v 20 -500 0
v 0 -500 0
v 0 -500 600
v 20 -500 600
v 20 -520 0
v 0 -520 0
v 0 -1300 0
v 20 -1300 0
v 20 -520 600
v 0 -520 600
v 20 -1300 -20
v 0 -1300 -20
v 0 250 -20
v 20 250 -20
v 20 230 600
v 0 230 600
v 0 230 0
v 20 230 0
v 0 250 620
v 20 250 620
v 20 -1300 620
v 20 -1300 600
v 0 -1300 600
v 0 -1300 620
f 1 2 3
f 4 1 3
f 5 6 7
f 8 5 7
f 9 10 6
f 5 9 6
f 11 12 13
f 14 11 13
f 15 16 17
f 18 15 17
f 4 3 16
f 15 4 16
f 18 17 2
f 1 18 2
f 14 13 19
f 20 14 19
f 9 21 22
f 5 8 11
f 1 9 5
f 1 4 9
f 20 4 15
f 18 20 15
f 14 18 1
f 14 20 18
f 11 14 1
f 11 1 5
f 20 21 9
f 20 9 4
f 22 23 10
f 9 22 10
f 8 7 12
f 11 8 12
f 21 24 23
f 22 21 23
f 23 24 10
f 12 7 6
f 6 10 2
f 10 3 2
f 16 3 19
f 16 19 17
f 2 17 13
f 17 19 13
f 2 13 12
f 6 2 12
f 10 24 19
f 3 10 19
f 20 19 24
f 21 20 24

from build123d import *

# Parameters (mm, degrees)
BOSS_EXTRUDE1_DEPTH = 20


with BuildPart() as part:
    # Sketch1 → Boss-Extrude1 (new body)
    with BuildSketch(Plane(origin=(0, 0, 0), x_dir=(0, 0, -1), z_dir=(1, 0, 0))):
        Polygon((-600, -650), (-600, -520), (0, -520), (0, -650), (0, -670), (0, -1300), (20, -1300), (20, -500), (20, 0), (20, 250), (0, 250), (-600, 250), (-620, 250), (-620, 0), (-620, -500), (-620, -1300), (-600, -1300), (-600, -670), align=None)
        Polygon((0, 230), (0, 0), (0, -500), (-600, -500), (-600, 0), (-600, 230), align=None, mode=Mode.SUBTRACT)
    extrude(amount=BOSS_EXTRUDE1_DEPTH)


solid = part.part
